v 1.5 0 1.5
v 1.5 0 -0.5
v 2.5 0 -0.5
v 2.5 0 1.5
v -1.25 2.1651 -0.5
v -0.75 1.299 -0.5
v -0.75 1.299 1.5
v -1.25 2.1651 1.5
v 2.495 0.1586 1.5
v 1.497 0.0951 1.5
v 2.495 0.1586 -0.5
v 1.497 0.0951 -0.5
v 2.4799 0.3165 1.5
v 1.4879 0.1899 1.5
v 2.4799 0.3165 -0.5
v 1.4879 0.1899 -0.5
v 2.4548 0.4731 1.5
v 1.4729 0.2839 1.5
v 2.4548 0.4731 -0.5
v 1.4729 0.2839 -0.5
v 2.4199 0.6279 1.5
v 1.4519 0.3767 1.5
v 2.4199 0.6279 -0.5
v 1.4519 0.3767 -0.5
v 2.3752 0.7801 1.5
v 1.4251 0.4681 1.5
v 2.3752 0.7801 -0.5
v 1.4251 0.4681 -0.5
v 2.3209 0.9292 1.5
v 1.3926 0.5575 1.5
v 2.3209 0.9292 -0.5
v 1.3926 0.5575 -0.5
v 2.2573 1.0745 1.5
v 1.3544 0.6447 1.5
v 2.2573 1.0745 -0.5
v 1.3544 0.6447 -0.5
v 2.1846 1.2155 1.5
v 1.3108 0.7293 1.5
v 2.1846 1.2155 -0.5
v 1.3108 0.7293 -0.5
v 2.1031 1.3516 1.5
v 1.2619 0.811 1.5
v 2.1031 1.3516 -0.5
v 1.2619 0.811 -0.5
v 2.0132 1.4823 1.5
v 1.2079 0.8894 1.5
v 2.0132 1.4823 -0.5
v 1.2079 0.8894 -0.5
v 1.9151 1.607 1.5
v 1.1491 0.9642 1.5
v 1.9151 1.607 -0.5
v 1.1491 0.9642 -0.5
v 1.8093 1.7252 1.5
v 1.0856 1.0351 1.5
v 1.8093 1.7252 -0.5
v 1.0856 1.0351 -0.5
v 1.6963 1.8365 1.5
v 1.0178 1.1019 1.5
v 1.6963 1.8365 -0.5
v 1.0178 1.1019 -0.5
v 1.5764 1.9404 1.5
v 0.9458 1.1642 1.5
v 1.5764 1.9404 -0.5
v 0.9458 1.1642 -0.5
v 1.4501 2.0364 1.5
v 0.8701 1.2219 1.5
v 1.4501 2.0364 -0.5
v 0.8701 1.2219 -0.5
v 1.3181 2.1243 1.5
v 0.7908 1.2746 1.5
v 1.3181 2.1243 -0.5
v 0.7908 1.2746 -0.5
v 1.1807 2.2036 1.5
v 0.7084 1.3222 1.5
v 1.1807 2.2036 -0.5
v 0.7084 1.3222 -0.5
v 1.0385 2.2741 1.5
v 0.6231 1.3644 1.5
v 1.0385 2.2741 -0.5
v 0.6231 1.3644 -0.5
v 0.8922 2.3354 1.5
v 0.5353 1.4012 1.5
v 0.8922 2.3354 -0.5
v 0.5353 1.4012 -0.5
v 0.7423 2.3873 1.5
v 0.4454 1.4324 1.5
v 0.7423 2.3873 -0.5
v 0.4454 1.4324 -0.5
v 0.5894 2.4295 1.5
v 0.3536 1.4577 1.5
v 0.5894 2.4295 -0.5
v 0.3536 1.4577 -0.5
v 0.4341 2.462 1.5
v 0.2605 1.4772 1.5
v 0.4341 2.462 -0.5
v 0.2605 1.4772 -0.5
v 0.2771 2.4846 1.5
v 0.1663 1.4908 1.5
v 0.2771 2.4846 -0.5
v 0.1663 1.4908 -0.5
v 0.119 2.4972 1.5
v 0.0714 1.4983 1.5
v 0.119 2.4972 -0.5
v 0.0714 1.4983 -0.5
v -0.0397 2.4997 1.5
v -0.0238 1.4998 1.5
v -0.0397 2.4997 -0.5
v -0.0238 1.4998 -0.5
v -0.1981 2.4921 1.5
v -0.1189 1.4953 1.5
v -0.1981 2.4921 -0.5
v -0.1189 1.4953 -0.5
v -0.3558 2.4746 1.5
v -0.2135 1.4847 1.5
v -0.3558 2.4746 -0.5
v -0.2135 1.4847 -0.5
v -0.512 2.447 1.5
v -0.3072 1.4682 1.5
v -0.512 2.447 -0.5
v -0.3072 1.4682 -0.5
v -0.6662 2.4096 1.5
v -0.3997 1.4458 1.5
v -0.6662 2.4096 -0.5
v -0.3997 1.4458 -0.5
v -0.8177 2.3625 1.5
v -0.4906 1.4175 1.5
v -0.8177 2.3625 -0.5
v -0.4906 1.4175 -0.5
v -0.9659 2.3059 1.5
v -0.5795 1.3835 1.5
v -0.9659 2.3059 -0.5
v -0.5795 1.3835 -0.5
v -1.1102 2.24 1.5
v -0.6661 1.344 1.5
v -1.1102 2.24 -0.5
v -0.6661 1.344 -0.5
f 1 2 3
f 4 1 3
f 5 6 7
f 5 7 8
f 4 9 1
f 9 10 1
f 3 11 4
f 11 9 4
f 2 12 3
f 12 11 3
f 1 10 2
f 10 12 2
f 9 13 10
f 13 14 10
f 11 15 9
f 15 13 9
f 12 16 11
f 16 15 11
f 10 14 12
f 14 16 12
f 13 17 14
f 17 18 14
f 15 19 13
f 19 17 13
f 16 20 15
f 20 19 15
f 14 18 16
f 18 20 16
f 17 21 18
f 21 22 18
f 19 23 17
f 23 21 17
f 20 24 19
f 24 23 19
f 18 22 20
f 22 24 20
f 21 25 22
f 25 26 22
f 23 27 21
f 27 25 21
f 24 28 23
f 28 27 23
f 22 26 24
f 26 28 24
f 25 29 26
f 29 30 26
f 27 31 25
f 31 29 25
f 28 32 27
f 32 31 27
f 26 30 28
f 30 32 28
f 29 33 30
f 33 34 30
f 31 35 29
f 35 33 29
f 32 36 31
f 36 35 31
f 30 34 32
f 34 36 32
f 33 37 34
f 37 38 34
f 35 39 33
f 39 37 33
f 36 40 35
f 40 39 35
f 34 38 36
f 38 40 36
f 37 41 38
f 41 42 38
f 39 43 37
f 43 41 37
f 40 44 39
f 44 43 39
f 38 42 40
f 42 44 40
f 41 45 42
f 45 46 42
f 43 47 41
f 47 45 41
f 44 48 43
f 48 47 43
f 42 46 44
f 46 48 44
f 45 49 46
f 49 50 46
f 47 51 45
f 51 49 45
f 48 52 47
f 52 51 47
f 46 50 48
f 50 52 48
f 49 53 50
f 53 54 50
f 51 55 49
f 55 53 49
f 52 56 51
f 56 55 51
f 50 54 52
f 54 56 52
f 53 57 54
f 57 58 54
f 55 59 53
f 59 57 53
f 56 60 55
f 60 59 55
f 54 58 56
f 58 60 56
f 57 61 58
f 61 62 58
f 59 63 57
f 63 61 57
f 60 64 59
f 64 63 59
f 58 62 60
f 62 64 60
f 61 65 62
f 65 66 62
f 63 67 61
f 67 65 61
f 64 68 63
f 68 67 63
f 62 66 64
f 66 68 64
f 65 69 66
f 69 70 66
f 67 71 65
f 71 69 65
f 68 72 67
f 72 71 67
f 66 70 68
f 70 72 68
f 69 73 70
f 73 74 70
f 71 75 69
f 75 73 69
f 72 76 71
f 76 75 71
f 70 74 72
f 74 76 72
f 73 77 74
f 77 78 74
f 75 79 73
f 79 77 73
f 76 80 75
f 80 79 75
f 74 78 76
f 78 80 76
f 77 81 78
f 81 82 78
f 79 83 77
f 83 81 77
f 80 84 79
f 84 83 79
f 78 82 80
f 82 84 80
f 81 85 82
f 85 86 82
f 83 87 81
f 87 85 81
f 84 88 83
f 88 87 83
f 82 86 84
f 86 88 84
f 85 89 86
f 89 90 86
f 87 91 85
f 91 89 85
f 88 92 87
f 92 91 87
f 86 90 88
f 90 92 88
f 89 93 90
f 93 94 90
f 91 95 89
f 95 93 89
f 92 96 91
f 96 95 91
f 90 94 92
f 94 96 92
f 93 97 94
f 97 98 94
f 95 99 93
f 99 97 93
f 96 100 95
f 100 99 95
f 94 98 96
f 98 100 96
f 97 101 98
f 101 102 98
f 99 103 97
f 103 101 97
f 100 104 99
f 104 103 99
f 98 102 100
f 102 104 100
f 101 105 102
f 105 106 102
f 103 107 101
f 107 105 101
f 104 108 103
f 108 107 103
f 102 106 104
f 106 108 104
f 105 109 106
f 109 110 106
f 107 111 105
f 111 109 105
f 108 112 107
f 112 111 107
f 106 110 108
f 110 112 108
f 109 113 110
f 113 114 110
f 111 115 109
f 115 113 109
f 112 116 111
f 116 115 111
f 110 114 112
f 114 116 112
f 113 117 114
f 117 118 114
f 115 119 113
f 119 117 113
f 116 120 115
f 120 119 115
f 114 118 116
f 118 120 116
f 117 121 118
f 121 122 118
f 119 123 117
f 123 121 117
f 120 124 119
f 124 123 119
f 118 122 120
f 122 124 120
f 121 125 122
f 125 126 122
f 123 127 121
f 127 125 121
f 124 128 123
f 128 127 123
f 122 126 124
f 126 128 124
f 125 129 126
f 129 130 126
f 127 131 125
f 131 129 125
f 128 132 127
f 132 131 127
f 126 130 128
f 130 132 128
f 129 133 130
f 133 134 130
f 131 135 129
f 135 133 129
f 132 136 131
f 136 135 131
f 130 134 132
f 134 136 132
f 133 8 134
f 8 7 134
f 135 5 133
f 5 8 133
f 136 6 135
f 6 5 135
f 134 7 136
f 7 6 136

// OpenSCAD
$fn=100;
rotate_extrude(angle=120)
translate([2, 0.5, 0])
square(size=[1, 2], center=true);
